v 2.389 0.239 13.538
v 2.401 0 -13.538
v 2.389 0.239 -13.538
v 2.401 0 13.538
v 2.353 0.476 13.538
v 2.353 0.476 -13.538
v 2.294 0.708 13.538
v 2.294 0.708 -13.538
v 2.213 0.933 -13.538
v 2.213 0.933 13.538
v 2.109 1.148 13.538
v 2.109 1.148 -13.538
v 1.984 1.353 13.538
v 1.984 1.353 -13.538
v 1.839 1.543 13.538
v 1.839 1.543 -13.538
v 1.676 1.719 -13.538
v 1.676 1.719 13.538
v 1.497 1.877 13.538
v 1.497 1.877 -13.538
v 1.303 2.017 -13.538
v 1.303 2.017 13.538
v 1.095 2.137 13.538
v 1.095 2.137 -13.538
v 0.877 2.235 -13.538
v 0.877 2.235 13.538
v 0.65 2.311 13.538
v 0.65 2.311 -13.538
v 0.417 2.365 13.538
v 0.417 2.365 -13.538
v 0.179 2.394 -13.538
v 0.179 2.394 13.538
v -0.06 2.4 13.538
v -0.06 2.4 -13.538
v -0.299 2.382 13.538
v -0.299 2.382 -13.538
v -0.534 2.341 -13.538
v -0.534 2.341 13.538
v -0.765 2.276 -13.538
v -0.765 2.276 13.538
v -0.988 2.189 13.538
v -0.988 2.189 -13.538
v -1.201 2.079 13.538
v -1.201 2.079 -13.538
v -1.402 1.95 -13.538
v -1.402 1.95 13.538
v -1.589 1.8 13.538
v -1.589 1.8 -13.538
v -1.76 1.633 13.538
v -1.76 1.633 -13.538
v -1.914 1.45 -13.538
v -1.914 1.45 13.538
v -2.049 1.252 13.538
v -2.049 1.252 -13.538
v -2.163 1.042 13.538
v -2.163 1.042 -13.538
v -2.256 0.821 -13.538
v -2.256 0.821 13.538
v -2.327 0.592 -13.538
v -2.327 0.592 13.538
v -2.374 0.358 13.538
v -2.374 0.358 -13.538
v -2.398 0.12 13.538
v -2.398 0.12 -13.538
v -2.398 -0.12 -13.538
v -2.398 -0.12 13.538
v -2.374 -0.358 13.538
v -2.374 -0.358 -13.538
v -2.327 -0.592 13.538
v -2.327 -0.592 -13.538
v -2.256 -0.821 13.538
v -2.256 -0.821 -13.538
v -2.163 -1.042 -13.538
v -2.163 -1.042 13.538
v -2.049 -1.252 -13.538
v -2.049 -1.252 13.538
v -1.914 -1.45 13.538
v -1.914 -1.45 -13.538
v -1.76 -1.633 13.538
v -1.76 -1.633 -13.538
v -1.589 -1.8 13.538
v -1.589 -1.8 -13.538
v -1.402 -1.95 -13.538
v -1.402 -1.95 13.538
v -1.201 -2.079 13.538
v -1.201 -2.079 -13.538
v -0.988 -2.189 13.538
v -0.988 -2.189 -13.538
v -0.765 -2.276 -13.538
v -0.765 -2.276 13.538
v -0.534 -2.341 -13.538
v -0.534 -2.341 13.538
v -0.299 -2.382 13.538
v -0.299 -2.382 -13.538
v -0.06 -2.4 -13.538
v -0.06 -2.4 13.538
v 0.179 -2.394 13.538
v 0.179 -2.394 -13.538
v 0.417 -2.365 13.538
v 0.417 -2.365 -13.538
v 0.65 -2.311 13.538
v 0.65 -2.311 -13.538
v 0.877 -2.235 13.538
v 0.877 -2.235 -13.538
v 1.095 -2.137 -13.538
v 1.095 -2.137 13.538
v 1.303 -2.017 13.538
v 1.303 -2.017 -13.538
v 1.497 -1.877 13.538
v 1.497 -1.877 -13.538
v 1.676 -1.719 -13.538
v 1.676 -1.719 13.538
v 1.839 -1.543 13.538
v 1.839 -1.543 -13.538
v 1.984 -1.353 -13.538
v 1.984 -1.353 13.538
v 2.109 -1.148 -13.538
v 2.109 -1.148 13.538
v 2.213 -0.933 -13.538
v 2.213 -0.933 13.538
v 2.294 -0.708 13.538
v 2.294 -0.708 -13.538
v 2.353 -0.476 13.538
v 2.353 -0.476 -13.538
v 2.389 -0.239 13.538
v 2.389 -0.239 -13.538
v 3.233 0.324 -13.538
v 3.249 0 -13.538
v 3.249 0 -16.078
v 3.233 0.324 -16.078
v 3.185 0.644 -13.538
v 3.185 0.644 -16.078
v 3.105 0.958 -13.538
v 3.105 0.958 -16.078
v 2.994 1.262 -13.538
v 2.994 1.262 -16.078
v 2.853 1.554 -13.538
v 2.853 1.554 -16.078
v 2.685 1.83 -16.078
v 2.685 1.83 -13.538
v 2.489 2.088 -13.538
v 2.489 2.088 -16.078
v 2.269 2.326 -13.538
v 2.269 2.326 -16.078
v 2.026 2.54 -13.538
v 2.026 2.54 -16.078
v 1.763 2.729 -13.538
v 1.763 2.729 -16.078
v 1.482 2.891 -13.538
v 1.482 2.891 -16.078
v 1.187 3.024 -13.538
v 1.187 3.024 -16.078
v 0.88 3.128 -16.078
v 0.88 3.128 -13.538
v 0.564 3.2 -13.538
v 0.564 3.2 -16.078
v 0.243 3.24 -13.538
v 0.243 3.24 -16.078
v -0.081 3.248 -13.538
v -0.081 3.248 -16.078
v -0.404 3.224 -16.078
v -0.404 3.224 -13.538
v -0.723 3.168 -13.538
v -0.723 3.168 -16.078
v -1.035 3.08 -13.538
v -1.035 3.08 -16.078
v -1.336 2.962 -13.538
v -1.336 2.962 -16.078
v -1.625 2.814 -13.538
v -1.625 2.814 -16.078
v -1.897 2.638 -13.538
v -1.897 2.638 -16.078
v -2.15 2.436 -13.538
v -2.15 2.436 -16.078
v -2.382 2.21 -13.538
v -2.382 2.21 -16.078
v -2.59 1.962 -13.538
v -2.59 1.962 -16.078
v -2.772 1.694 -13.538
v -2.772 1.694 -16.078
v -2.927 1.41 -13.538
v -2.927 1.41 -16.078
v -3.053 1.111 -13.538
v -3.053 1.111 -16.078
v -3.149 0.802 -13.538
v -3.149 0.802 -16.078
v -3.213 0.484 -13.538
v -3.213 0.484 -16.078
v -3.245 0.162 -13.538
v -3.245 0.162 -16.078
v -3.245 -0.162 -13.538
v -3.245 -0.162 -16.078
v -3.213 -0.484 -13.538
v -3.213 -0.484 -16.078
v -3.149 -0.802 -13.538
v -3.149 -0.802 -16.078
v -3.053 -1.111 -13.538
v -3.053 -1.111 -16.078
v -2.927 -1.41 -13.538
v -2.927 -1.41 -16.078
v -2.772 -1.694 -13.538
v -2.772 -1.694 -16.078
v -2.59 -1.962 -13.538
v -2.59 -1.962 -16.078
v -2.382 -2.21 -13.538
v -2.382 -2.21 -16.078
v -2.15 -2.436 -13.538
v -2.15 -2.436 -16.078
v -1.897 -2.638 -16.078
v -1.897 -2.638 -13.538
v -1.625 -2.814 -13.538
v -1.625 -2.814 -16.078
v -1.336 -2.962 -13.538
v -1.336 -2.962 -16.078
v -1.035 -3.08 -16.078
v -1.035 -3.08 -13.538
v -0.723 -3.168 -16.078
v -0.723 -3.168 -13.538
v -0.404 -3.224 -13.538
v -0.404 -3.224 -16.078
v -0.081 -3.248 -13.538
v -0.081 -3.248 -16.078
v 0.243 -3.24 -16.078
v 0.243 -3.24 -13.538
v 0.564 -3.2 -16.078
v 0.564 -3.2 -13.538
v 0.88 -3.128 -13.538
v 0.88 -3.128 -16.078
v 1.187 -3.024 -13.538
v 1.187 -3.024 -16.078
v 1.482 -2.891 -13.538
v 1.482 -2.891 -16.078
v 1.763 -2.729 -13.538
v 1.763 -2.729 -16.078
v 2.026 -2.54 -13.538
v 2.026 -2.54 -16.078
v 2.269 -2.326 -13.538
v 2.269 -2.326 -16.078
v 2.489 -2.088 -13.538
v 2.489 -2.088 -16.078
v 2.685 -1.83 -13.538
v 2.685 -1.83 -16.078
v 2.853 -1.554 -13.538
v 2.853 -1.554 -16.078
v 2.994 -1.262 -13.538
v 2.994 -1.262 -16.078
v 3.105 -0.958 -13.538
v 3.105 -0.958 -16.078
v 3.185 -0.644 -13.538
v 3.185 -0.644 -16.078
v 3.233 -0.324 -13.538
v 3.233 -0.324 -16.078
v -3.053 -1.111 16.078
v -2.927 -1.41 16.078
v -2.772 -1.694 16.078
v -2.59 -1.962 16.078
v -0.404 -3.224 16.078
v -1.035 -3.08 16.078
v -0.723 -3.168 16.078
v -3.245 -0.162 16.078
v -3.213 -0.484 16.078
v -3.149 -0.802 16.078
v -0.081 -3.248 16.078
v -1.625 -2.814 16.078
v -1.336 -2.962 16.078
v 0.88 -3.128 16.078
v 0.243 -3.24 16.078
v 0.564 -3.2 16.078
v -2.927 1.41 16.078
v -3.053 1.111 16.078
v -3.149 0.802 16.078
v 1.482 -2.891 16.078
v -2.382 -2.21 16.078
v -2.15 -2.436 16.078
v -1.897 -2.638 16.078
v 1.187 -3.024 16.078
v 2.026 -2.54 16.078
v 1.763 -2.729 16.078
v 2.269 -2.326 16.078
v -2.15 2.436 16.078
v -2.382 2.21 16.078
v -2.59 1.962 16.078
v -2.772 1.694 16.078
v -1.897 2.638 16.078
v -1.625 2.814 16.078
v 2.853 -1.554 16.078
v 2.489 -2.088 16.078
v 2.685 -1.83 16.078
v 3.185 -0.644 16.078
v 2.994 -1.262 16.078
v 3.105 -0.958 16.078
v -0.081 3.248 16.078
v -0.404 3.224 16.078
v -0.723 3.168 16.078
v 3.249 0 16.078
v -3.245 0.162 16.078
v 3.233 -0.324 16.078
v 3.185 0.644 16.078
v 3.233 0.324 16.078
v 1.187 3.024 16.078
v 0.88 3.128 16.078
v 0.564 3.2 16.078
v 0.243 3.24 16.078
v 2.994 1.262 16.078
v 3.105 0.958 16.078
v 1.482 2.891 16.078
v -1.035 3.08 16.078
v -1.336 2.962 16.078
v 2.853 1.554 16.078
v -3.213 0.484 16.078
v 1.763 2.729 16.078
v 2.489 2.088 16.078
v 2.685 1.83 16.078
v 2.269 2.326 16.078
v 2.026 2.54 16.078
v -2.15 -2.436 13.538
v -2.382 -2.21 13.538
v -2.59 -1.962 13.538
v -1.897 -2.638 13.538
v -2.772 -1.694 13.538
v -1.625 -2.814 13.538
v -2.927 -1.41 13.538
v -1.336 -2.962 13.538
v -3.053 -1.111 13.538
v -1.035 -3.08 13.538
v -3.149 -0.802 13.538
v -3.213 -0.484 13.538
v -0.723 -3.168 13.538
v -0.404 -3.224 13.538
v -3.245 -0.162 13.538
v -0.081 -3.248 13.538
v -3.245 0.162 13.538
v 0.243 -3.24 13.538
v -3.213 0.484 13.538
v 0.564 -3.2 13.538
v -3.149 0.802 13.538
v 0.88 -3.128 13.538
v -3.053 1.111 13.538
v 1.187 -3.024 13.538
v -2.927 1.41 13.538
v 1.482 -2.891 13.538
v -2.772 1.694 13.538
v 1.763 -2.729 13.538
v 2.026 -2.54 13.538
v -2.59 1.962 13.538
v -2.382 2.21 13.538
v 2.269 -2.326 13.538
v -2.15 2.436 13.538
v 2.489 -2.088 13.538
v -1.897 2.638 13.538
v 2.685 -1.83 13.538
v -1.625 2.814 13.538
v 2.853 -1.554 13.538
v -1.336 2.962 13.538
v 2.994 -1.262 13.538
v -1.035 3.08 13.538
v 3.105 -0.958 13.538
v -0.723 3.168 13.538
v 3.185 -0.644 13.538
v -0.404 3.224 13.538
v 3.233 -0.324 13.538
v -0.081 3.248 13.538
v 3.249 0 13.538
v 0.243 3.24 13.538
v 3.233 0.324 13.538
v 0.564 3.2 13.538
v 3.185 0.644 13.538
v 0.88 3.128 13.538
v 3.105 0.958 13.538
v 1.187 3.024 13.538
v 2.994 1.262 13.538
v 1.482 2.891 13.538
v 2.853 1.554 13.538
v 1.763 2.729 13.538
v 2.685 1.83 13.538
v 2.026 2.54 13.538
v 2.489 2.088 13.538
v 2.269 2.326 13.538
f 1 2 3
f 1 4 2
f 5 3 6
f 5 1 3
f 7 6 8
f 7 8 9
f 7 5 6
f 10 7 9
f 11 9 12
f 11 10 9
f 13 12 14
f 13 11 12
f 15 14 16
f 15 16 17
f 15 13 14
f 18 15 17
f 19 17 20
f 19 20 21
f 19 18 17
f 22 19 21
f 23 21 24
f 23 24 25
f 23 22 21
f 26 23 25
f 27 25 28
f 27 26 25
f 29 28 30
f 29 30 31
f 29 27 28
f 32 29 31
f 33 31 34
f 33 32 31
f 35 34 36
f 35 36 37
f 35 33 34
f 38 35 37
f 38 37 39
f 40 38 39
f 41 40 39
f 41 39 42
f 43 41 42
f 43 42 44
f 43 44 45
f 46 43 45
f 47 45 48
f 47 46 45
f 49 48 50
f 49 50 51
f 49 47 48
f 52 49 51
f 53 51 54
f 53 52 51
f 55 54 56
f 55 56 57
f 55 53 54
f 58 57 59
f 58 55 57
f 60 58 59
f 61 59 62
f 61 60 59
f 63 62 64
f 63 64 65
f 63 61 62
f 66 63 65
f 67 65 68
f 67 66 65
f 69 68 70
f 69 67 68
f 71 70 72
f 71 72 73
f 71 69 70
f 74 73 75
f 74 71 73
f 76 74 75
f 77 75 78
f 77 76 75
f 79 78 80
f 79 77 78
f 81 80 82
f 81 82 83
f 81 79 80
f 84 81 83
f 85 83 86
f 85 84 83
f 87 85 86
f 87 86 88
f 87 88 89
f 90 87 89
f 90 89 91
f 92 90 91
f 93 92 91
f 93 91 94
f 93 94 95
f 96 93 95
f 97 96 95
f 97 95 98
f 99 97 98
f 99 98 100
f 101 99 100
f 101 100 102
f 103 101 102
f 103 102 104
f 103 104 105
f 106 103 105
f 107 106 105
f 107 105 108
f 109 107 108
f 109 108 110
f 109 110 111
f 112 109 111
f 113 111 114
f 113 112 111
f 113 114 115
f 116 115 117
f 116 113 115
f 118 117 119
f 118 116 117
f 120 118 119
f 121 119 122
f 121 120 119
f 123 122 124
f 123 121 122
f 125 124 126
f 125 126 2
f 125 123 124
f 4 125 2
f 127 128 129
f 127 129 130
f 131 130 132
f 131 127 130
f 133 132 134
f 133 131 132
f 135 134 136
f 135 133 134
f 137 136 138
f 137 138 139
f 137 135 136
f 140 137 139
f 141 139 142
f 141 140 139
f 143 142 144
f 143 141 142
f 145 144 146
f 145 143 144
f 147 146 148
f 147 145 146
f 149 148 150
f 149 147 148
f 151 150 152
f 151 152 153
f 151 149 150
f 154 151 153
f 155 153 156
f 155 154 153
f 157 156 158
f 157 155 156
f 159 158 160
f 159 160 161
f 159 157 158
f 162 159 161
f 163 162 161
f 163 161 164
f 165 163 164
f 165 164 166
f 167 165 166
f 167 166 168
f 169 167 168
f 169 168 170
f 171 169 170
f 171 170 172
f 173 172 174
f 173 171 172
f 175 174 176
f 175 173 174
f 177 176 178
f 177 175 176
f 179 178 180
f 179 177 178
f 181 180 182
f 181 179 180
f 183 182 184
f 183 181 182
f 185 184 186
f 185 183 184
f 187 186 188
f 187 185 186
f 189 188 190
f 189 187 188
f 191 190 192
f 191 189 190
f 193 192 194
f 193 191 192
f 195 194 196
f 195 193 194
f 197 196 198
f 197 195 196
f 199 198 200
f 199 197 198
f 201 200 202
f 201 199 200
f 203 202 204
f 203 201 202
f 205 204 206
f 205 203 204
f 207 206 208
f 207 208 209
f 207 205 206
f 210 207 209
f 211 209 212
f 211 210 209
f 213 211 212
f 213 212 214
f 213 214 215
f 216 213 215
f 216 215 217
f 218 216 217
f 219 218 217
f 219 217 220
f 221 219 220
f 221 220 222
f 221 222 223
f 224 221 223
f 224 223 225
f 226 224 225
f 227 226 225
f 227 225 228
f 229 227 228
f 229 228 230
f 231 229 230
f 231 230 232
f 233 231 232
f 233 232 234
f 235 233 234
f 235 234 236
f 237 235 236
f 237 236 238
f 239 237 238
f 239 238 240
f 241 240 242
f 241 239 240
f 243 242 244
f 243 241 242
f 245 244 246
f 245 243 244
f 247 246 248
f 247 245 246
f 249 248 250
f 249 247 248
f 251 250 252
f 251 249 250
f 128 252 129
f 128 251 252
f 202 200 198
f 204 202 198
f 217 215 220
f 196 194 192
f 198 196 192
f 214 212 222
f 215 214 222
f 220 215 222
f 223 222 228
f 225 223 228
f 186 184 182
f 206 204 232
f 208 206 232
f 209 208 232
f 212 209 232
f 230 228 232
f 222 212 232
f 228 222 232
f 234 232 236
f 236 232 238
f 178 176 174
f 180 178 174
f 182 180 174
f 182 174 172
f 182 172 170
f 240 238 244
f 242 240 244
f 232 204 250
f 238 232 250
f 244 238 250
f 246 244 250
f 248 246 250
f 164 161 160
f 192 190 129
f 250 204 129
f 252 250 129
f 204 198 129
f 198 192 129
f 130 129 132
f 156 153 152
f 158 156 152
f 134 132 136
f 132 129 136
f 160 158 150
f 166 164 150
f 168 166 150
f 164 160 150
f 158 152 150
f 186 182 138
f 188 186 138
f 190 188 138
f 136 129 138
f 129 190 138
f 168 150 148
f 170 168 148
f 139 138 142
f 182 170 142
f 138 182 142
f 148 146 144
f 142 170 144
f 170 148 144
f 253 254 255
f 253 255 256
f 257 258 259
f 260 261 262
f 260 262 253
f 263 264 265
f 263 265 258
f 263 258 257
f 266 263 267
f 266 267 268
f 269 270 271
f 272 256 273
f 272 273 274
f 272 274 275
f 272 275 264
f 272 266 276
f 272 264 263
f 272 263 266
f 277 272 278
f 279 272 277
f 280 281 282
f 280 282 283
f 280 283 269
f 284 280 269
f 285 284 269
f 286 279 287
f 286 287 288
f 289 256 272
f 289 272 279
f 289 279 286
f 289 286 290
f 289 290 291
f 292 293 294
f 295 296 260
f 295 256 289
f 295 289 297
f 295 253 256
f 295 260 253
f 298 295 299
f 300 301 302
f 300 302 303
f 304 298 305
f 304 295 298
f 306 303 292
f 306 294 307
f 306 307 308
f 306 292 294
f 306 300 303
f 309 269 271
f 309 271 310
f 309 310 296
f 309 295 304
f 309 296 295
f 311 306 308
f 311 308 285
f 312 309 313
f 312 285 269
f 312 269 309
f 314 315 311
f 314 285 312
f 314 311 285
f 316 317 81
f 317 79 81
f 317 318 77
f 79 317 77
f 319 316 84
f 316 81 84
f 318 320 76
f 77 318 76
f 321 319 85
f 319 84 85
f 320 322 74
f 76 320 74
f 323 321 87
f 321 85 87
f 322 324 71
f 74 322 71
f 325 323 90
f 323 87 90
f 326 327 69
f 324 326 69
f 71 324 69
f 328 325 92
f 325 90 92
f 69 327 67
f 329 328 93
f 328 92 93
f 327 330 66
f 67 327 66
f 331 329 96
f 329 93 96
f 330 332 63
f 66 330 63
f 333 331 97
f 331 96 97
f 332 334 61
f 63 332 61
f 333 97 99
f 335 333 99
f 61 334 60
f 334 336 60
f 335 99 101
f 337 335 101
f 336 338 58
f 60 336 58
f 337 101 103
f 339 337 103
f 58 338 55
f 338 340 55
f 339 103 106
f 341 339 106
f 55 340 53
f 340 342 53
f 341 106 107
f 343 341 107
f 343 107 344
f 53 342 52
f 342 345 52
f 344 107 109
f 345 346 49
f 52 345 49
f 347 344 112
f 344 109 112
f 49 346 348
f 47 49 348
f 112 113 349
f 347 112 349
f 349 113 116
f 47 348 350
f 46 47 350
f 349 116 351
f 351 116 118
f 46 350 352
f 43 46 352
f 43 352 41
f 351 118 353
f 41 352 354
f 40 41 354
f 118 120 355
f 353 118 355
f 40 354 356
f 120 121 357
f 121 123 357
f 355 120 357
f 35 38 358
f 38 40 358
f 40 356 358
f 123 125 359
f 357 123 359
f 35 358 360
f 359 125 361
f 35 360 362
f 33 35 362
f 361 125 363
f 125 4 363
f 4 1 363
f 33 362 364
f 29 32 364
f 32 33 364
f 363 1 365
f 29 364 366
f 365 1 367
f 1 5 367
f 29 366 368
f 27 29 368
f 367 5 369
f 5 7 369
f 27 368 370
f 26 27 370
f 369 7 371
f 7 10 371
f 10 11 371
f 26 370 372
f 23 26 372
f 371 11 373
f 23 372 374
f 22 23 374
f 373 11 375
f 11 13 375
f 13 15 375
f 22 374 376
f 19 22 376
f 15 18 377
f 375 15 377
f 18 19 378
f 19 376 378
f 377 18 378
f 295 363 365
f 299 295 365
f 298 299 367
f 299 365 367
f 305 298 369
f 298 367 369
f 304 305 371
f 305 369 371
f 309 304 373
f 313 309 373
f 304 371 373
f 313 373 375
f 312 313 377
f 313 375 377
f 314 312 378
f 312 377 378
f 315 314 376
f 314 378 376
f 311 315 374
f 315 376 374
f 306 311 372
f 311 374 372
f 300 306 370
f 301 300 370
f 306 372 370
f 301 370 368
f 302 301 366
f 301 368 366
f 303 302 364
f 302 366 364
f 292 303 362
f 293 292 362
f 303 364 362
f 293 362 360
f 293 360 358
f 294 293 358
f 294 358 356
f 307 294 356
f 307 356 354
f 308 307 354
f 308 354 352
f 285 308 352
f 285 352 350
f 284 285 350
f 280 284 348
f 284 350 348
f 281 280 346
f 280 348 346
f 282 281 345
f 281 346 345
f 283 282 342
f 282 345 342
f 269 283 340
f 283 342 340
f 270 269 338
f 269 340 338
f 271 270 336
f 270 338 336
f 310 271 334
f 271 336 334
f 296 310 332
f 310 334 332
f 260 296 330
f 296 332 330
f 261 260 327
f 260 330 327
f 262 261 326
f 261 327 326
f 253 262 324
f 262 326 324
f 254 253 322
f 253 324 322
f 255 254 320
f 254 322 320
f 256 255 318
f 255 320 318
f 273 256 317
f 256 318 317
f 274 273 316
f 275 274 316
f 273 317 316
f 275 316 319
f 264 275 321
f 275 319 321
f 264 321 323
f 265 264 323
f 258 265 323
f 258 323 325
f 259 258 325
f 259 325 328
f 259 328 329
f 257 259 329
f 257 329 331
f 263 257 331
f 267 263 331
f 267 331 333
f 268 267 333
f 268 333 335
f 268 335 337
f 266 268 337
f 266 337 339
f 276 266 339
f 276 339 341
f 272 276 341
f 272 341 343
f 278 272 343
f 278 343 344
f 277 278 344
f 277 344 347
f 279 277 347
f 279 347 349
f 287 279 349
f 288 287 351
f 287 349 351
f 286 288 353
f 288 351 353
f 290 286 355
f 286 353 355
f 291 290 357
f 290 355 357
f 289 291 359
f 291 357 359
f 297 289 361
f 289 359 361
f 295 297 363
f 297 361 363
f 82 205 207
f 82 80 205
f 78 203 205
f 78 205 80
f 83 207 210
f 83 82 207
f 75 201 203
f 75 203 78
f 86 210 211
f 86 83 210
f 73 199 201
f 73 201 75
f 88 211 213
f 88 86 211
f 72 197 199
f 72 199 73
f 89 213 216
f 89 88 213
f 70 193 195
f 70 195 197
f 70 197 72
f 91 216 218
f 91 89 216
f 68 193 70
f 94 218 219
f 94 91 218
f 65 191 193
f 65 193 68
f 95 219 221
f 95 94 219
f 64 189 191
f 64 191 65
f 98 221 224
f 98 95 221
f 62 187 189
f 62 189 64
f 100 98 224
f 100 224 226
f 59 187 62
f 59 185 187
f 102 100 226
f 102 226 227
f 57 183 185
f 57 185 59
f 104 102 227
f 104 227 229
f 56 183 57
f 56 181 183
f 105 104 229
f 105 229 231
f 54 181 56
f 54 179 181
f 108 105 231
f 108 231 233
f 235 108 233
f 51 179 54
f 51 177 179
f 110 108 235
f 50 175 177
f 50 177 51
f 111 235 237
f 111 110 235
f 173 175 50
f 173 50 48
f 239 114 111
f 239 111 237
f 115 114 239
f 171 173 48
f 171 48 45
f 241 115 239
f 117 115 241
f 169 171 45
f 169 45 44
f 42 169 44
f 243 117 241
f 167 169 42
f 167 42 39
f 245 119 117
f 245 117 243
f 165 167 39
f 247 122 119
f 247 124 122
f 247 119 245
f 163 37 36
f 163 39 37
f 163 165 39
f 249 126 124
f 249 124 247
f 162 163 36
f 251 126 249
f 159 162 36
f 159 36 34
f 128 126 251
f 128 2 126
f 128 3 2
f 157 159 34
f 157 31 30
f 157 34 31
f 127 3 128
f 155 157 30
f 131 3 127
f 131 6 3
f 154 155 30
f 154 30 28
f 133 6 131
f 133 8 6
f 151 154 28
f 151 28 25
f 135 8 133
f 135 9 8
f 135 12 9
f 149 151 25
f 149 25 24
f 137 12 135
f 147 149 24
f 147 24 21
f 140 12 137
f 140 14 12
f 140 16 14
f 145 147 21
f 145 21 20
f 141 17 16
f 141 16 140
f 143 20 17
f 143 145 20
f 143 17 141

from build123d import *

# Parameters (mm, degrees)
F0_R          = 2.4010472057
F1_DEPTH      = 13.5382
F1_DEPTH_BACK = 13.5382
F2_R          = 3.2490620178
F3_DEPTH      = 2.54


# Not quite as in the source:
# - a pattern or mirror of a feature is missing from the dataset's text; its kind, count and spacing are read off the source's solid


with BuildPart() as f1:
    # F0 (on Top) → F1 (new body, two sides)
    with BuildSketch(Plane.XY) as f1_sk:
        Circle(F0_R)
    extrude(amount=F1_DEPTH)
    extrude(f1_sk.sketch, amount=-F1_DEPTH_BACK)

    # F2 (on face) → F3 (join)
    with BuildSketch(Plane.XY.offset(13.5382)):
        Circle(F2_R)
    f3 = extrude(amount=F3_DEPTH)

    # F3_copies: F3 across plane
    add(f3.mirror(Plane(origin=(0, 0, 0), x_dir=(-1, 0, 0), z_dir=(0, 0, -1))))


solid = f1.part
